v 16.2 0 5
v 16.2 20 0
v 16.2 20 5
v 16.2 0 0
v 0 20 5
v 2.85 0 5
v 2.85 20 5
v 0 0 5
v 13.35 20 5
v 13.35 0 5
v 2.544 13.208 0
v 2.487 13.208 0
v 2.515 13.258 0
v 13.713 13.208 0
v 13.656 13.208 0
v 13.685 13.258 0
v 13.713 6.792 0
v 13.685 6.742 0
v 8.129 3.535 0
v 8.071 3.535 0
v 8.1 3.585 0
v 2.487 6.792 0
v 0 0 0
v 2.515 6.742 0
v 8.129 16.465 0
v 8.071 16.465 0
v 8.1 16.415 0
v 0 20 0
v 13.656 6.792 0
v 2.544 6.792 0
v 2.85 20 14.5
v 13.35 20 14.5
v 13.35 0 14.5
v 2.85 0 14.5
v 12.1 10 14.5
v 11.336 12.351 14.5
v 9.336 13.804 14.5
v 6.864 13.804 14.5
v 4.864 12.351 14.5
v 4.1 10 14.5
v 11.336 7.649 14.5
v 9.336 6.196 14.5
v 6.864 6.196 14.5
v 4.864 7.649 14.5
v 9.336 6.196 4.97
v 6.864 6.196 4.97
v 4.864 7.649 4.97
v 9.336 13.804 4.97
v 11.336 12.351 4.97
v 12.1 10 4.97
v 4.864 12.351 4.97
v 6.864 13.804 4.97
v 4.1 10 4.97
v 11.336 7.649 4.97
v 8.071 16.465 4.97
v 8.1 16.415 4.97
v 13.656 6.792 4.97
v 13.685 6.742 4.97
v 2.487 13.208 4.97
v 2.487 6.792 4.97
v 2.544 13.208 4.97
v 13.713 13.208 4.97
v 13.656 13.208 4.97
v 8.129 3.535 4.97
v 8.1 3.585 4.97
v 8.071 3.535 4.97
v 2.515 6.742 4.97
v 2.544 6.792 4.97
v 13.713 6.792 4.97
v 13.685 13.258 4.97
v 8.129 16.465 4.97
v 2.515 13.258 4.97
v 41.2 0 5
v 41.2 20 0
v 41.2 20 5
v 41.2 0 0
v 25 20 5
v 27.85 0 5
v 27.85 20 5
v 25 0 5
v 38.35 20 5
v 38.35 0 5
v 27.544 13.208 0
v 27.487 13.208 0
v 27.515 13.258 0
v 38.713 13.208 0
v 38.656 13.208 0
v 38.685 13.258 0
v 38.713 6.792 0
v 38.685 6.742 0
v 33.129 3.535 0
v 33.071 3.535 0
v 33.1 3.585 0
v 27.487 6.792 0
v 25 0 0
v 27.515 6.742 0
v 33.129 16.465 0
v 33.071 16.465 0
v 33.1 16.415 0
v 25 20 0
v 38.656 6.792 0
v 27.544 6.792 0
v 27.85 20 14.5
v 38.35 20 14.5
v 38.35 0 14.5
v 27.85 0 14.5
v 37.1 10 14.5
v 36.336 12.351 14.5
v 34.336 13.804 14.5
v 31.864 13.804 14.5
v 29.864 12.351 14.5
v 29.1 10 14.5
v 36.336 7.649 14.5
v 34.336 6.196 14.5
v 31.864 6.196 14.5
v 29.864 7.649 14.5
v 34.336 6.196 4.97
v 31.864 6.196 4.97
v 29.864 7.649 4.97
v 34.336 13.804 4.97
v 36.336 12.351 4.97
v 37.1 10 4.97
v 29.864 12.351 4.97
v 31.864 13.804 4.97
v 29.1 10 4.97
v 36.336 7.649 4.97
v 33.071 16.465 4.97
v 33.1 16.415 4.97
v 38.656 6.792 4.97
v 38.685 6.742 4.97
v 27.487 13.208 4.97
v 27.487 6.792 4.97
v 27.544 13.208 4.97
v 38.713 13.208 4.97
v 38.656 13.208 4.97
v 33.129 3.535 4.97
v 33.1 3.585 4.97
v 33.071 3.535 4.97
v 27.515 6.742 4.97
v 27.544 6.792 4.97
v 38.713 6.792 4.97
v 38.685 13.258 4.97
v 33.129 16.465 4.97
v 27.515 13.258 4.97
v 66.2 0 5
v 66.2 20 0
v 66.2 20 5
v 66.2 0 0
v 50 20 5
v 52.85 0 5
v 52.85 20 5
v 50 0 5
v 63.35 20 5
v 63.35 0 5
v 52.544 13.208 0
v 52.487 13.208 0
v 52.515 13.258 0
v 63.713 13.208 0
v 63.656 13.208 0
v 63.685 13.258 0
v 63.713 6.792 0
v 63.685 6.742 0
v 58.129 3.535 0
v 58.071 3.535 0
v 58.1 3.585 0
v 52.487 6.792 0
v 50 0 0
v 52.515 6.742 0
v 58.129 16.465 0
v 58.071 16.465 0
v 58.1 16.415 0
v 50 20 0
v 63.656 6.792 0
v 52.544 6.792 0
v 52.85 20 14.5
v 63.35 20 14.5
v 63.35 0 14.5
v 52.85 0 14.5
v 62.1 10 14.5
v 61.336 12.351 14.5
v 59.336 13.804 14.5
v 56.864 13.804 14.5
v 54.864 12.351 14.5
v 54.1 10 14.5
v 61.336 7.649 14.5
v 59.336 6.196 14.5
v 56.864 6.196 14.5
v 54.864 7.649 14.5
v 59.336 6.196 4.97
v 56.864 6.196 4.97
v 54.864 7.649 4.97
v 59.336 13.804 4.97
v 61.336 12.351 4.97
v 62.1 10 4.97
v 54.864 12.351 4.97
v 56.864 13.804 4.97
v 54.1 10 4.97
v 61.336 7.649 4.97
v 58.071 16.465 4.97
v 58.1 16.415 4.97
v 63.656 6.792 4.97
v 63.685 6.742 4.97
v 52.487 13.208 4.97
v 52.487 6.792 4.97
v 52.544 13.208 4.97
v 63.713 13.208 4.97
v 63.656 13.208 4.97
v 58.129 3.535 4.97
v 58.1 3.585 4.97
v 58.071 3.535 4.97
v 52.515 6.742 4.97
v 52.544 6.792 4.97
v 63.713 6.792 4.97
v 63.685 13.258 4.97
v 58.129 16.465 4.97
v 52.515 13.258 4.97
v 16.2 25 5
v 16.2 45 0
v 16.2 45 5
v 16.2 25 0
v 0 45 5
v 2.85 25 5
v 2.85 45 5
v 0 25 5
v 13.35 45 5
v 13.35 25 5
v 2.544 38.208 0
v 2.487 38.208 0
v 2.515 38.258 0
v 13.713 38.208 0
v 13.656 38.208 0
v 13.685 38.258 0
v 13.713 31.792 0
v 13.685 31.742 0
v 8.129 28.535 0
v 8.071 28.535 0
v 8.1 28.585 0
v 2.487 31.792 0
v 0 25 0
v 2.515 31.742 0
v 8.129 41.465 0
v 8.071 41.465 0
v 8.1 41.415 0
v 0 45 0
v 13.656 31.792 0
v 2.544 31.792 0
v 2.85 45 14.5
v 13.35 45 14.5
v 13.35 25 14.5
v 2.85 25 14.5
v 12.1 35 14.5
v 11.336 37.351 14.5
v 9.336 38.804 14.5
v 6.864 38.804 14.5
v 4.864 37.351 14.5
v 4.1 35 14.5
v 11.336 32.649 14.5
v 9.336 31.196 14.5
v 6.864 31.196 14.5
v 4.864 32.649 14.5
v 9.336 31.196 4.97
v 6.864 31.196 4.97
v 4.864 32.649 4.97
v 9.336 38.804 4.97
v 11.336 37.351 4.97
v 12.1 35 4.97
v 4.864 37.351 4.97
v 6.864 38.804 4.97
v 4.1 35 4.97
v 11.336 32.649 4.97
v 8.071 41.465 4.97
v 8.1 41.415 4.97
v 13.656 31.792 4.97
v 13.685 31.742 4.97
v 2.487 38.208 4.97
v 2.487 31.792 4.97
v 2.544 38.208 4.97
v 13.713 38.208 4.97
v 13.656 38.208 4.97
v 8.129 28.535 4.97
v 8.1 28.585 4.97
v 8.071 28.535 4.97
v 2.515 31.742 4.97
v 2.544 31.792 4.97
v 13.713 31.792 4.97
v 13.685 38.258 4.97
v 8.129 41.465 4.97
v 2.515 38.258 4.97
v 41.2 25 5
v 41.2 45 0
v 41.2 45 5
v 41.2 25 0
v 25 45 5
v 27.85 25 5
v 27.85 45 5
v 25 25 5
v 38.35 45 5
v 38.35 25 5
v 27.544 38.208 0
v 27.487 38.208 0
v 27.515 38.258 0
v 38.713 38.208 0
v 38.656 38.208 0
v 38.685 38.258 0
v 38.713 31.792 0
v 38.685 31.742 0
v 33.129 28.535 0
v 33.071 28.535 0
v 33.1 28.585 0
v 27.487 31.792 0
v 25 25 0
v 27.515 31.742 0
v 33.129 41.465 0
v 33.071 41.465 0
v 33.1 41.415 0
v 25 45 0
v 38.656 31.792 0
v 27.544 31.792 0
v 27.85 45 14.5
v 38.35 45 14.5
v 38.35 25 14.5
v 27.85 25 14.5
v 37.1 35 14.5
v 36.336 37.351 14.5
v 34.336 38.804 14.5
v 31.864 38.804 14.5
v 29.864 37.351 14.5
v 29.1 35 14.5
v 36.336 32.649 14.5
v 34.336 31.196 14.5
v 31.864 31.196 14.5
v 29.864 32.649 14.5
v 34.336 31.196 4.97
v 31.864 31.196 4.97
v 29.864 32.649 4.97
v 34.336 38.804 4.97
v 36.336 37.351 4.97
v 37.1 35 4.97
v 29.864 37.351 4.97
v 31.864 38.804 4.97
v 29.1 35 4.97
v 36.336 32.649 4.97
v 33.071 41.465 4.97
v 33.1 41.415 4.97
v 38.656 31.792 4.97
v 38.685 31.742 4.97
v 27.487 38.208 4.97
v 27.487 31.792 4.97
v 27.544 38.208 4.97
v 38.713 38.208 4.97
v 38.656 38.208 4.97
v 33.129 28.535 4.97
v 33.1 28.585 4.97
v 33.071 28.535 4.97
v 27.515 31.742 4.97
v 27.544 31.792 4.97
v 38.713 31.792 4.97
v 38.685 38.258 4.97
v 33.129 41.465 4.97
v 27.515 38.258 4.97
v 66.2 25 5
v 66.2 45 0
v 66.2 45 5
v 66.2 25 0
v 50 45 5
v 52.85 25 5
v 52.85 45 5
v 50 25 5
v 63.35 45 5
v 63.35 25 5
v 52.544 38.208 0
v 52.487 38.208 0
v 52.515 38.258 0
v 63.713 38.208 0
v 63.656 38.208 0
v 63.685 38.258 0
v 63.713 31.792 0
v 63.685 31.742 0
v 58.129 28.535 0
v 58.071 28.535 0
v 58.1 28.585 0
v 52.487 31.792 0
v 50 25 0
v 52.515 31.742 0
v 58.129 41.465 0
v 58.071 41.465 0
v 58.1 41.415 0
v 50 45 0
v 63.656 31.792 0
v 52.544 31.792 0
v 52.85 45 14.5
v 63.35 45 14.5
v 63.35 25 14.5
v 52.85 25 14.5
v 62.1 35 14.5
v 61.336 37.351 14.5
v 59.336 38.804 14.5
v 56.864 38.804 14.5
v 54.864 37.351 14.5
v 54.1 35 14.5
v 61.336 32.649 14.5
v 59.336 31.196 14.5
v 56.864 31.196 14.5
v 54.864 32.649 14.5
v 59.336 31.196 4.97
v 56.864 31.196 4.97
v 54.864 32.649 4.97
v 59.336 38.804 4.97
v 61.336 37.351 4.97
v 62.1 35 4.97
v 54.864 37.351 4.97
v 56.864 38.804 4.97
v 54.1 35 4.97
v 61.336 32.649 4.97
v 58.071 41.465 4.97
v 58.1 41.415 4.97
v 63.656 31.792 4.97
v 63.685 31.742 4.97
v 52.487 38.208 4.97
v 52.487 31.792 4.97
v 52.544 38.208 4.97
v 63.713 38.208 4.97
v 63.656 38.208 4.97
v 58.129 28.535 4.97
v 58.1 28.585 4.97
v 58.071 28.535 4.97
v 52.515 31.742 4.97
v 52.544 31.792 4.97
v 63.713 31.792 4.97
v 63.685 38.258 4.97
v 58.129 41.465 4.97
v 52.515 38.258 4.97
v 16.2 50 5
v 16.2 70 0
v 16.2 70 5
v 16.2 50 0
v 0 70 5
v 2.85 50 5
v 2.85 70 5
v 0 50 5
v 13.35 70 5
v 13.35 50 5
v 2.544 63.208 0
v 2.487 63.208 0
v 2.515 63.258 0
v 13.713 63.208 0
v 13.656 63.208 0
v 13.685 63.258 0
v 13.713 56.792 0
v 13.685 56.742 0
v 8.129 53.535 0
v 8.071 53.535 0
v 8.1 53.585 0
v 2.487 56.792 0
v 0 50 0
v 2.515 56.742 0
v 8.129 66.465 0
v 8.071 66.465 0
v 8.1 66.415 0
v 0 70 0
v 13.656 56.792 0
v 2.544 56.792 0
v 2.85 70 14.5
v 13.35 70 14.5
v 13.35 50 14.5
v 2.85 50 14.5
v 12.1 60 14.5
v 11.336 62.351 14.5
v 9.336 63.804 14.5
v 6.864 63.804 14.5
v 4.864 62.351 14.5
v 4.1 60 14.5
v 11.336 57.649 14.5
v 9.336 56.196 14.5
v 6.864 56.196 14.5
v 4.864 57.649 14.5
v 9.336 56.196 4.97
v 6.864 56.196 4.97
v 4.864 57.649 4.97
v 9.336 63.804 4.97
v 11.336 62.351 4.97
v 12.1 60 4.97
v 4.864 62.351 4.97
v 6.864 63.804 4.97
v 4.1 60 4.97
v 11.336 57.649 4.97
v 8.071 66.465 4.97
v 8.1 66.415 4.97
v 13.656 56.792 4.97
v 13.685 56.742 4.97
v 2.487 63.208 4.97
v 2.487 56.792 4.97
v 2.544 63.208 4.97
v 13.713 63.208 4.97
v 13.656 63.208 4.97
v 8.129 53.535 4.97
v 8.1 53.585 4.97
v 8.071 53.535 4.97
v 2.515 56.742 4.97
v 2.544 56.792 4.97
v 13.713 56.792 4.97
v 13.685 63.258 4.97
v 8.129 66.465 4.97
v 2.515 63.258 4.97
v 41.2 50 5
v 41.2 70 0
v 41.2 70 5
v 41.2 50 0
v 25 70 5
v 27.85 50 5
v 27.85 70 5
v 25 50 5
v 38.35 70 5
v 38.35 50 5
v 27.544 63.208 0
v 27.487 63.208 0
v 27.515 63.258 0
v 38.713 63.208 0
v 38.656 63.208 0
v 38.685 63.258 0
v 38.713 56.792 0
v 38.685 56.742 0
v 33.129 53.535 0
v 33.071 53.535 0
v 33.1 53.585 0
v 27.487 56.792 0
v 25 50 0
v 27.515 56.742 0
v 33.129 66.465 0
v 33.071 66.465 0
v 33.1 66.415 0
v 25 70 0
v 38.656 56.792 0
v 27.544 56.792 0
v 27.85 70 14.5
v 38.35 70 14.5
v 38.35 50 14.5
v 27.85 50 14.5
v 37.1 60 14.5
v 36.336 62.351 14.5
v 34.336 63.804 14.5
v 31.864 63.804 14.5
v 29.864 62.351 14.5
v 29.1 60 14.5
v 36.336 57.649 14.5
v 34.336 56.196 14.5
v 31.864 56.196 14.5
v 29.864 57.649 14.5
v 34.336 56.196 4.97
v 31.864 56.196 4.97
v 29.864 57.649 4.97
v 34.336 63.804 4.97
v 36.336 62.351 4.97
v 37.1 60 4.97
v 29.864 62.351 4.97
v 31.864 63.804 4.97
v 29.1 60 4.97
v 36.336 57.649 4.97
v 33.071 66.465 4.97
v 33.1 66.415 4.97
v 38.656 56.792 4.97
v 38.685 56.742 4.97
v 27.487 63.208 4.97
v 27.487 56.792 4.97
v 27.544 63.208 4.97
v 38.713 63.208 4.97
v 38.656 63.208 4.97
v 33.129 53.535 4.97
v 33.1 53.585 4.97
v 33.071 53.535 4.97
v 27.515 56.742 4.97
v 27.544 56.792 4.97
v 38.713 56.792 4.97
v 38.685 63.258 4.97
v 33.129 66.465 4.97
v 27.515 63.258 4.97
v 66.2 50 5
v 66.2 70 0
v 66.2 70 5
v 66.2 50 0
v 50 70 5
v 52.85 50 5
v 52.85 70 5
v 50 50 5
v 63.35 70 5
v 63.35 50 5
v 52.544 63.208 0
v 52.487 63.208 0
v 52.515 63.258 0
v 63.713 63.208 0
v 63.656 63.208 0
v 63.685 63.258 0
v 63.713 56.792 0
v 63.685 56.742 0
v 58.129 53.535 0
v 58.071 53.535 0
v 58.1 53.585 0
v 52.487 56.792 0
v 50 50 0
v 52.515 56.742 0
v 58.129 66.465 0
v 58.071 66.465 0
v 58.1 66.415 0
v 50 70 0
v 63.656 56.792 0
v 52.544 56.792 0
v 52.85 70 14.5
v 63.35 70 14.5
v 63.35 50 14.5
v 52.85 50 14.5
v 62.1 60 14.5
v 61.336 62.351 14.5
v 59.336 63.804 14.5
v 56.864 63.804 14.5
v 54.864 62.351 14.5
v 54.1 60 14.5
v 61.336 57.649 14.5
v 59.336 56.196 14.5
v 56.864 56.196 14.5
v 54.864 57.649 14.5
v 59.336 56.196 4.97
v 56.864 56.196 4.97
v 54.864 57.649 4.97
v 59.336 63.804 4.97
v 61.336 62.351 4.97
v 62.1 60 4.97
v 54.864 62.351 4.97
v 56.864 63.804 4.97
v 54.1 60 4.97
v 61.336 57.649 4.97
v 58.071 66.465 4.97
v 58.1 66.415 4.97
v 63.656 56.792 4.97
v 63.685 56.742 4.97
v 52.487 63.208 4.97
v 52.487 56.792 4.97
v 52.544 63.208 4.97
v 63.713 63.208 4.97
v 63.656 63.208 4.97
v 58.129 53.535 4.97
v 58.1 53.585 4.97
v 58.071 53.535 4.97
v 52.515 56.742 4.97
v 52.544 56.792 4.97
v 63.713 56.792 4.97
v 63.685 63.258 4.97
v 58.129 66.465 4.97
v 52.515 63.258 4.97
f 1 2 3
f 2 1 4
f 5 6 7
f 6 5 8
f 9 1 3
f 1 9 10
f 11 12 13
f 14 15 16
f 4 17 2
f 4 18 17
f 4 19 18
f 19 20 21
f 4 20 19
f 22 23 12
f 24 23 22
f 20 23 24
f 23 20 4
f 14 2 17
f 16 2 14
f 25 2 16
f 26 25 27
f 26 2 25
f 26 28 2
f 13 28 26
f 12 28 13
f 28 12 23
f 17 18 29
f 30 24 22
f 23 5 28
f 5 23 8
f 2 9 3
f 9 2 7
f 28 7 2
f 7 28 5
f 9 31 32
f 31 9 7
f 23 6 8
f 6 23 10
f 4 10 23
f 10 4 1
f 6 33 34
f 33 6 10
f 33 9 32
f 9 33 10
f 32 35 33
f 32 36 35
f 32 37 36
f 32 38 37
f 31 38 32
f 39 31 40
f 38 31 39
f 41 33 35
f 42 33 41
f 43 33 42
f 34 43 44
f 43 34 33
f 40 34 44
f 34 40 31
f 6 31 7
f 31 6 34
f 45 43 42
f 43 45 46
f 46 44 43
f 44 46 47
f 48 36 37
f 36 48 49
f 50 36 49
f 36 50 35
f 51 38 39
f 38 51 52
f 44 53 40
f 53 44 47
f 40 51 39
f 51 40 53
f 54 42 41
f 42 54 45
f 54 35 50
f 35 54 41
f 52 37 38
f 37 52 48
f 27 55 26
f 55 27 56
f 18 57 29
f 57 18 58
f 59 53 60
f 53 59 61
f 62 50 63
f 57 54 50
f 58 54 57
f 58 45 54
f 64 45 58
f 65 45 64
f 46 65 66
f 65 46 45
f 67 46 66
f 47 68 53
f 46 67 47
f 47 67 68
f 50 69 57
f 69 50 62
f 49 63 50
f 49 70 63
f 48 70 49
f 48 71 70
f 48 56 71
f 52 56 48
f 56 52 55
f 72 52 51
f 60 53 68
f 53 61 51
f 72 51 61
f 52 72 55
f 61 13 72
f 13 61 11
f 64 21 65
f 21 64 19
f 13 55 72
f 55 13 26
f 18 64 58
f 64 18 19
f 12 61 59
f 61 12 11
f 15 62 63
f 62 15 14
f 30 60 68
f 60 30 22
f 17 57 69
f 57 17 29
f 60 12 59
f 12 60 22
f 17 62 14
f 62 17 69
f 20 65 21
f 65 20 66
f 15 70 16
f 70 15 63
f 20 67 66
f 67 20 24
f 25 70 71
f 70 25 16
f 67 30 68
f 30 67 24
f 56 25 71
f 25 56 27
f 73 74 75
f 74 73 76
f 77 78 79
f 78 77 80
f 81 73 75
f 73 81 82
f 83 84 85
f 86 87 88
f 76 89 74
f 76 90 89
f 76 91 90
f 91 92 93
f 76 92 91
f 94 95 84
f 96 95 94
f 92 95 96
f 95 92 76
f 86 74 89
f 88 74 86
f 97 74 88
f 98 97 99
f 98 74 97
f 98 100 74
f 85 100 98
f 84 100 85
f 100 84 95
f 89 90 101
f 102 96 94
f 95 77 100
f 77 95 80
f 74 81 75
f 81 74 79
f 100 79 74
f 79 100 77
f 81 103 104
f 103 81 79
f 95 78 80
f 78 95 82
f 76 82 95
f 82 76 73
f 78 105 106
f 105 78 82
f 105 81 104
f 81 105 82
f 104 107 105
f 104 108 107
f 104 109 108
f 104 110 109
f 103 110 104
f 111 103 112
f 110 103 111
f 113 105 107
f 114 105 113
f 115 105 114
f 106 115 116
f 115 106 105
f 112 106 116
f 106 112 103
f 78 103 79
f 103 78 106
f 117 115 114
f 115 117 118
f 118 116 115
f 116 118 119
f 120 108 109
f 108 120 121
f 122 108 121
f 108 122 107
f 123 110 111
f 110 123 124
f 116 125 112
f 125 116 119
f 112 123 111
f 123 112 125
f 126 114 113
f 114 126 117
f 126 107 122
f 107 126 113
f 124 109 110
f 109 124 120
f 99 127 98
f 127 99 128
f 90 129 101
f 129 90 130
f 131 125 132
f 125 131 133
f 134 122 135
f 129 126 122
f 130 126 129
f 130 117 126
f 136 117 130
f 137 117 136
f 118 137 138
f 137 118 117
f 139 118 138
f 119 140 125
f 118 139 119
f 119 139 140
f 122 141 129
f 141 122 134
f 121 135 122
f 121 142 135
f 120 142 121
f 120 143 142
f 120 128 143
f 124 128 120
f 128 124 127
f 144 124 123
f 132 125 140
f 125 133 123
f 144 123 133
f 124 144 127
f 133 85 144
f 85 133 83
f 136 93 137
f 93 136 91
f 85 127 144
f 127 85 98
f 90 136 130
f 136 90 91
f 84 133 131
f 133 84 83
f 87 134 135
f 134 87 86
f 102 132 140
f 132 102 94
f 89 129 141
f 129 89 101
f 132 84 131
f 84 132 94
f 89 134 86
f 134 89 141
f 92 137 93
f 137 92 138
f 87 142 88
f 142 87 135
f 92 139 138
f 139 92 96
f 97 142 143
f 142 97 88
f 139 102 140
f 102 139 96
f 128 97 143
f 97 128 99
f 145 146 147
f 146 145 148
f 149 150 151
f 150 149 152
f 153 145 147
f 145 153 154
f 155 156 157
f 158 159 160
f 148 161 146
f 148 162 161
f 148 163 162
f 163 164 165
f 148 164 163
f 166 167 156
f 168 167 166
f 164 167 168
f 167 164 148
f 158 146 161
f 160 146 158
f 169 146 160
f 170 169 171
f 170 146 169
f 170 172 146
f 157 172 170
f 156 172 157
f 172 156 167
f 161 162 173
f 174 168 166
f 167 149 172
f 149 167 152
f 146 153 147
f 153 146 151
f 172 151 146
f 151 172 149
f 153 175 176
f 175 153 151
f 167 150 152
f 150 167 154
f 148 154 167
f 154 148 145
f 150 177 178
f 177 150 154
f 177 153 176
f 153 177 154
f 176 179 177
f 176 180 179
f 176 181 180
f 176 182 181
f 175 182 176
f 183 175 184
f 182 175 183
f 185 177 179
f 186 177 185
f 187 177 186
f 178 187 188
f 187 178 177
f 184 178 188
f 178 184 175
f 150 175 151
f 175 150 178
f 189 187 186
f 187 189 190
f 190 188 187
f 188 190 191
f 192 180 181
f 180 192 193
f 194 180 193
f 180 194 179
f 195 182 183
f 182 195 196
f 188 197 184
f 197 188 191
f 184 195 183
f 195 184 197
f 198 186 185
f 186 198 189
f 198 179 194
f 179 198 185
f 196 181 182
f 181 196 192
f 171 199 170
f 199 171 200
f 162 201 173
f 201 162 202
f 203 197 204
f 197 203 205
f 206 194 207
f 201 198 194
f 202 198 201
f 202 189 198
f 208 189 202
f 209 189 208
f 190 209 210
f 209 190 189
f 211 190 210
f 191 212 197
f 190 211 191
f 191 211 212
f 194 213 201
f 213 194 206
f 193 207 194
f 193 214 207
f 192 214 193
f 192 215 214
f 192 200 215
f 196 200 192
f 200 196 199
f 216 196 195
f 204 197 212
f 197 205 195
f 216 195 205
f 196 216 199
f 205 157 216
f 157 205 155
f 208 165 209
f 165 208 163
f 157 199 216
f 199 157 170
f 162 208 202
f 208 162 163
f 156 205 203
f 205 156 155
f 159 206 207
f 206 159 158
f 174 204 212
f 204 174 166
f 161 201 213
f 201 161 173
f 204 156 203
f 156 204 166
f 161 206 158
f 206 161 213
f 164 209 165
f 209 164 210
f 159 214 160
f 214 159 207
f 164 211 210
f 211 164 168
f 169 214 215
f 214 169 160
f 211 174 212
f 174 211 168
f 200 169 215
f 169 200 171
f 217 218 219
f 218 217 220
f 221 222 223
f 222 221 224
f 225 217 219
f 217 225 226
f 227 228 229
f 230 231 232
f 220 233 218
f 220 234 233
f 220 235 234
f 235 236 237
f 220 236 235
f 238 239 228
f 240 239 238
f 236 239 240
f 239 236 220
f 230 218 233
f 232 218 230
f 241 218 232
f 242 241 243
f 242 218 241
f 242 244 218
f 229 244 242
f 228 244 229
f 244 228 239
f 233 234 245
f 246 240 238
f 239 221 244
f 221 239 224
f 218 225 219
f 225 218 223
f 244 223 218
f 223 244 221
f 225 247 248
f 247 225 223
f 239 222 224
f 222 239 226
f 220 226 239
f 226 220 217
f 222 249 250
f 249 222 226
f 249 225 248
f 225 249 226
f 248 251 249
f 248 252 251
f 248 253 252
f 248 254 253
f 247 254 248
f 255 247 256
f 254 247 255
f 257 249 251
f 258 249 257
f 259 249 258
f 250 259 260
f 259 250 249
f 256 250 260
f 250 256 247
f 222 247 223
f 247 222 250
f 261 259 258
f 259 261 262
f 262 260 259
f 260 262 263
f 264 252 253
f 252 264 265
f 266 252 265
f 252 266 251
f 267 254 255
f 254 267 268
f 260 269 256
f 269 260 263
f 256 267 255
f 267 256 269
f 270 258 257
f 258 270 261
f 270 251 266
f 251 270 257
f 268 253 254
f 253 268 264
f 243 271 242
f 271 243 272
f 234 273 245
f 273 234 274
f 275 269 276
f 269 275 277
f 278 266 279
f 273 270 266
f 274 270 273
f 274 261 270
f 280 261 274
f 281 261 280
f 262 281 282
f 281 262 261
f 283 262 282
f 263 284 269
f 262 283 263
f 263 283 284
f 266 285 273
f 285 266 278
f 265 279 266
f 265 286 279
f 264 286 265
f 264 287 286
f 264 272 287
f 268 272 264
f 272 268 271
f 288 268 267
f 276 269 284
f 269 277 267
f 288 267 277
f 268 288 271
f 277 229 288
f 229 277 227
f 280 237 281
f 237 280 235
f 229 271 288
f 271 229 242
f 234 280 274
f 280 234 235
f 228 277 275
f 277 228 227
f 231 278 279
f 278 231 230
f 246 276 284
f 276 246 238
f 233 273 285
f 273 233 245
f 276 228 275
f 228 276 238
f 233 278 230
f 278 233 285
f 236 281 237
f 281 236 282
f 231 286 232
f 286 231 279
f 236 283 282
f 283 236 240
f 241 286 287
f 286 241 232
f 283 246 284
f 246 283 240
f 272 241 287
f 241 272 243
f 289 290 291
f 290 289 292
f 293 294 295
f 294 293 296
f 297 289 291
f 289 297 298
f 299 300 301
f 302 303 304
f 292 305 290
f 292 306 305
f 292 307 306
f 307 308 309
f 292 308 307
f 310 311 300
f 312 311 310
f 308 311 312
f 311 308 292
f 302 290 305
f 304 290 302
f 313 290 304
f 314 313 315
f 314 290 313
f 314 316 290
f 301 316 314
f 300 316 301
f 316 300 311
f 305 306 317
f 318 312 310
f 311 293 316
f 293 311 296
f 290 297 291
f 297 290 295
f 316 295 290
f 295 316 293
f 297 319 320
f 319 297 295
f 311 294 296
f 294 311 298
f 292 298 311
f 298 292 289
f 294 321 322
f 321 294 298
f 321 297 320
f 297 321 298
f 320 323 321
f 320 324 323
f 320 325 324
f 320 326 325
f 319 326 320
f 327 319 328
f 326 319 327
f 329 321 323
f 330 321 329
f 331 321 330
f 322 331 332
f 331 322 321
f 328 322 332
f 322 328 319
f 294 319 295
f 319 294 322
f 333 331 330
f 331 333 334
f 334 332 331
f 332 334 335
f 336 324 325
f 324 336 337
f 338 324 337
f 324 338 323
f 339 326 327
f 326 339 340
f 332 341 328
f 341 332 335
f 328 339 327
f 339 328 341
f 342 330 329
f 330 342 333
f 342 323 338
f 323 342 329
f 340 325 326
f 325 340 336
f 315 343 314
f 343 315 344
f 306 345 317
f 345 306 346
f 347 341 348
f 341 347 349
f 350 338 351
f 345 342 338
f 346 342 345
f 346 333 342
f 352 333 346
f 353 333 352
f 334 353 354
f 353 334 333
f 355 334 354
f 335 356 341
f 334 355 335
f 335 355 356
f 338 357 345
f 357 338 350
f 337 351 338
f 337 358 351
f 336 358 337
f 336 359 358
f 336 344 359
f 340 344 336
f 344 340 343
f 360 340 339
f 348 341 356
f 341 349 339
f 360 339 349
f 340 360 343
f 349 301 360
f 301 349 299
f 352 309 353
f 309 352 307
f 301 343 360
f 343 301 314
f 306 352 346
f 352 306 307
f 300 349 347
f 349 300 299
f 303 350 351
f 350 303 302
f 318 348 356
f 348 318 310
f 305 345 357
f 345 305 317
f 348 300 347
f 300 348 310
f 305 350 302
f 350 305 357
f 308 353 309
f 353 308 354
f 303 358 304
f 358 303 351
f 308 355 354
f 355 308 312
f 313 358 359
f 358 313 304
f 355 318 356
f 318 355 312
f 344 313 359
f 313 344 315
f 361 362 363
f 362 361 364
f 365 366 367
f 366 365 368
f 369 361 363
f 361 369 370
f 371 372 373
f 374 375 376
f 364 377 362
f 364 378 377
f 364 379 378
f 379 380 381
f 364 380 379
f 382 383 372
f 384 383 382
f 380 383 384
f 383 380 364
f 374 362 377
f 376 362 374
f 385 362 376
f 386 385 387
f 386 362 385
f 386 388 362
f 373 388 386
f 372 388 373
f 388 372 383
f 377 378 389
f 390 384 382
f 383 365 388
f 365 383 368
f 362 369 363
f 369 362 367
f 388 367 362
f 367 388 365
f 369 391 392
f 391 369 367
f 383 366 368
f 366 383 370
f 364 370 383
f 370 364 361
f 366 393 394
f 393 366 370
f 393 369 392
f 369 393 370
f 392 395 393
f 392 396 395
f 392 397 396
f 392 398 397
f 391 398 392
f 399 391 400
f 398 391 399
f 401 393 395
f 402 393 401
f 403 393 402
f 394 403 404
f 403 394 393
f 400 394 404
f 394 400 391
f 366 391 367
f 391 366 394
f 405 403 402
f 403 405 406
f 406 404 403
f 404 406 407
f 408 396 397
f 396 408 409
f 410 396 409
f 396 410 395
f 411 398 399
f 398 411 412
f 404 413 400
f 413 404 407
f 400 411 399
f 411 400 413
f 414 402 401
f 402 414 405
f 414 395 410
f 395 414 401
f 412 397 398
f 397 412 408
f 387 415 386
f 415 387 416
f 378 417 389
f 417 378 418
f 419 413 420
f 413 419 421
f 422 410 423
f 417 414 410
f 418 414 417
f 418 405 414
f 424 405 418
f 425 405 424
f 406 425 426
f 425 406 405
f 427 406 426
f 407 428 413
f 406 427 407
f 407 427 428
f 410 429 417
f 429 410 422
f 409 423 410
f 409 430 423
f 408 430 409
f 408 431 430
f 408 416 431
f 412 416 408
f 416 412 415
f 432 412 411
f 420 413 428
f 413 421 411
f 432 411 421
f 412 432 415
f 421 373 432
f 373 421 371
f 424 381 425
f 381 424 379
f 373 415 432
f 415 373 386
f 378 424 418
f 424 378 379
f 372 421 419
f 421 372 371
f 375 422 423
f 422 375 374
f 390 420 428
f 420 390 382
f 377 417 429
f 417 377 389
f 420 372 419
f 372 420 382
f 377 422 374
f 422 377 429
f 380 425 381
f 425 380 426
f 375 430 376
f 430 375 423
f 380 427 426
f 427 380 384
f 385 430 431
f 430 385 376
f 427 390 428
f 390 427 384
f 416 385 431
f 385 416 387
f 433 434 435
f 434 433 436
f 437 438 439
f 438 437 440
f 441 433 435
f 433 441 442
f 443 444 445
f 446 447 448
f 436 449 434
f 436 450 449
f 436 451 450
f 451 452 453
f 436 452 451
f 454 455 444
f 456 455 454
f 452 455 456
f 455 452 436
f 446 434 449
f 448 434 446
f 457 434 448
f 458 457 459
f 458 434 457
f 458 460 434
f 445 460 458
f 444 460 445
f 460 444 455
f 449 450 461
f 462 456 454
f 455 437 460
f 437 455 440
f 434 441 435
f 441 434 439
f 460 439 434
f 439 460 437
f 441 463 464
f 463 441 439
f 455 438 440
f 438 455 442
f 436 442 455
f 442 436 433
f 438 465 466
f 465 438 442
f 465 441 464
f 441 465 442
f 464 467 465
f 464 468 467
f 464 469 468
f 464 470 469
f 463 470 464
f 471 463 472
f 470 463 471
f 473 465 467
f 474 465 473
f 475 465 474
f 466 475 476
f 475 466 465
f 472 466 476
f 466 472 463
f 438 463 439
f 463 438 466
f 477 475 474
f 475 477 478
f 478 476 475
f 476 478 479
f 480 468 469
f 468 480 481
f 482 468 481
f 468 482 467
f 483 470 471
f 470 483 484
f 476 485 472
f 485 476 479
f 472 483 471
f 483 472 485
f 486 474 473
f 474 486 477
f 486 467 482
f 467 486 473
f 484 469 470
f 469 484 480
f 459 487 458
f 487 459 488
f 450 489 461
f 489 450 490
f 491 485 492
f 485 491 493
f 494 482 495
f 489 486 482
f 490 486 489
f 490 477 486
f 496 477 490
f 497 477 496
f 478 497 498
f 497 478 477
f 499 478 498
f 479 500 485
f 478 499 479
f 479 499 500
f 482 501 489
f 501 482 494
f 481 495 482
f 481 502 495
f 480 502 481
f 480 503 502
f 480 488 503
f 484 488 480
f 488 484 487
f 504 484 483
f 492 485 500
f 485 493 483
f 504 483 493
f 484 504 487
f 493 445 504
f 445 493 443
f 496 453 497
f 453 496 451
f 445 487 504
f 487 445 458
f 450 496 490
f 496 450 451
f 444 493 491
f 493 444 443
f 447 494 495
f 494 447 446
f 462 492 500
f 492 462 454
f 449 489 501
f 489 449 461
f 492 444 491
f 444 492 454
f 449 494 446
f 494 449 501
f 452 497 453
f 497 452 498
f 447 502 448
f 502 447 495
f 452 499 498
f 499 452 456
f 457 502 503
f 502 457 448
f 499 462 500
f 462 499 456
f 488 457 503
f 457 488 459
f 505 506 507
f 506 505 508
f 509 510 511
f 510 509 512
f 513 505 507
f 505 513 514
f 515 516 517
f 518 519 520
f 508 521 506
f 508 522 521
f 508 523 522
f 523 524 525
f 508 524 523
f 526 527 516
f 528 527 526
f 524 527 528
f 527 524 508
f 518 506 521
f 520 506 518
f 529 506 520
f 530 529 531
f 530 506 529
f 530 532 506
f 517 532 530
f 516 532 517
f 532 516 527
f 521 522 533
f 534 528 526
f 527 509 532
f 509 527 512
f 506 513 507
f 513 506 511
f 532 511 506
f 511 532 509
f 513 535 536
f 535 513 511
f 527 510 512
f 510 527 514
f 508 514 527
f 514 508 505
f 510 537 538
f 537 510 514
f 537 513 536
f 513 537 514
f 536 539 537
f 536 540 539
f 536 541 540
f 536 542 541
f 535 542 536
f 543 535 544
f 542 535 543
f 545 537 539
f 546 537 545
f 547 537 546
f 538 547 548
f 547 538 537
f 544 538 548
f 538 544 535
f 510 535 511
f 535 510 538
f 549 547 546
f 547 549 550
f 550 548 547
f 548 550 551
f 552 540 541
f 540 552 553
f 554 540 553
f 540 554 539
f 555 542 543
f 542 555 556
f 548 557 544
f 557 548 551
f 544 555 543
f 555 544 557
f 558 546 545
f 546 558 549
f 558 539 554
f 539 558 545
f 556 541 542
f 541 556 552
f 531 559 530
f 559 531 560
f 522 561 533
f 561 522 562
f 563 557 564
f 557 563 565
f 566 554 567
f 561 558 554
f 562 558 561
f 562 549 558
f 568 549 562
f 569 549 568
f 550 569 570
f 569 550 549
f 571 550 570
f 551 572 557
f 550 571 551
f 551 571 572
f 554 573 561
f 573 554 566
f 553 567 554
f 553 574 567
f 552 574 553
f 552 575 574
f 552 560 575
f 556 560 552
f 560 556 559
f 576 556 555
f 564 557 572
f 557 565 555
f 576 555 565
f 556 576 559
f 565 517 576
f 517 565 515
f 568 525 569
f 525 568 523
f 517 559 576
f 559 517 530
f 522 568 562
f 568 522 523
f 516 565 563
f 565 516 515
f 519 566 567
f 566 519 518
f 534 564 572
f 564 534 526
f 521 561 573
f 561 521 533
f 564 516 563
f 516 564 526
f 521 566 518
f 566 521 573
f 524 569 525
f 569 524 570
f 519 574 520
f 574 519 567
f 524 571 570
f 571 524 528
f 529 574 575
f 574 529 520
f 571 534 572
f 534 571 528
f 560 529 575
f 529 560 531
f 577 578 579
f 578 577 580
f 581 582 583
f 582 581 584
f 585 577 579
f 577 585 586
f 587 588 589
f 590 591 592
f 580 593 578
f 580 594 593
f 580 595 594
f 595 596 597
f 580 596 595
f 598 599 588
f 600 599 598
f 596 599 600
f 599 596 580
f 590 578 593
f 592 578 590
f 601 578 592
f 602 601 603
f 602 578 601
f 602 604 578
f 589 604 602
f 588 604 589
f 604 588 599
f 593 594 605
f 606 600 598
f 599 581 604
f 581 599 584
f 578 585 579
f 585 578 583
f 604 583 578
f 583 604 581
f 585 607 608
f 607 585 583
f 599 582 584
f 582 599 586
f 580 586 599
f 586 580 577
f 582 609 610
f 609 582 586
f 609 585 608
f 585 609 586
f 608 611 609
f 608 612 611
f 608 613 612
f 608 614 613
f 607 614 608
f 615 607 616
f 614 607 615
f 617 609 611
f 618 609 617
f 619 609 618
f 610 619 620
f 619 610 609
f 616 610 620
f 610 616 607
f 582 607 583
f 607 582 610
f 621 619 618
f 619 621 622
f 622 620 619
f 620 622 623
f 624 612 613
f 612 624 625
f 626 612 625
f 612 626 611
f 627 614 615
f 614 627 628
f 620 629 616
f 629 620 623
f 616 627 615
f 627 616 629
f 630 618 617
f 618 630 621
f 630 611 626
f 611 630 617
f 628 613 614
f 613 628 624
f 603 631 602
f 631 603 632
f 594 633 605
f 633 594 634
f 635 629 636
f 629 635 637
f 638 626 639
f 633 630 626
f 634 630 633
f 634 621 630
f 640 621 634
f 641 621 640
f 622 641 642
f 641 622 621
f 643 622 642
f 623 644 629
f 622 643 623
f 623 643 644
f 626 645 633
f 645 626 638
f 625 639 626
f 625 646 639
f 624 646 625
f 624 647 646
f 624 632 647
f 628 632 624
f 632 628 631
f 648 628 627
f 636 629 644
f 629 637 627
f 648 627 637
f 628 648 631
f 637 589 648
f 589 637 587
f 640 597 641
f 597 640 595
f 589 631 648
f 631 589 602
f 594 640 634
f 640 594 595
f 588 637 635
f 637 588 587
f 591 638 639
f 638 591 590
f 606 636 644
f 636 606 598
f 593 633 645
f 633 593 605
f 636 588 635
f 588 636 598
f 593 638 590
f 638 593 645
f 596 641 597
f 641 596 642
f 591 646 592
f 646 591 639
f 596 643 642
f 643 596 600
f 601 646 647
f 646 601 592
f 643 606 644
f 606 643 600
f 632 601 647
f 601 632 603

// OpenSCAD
use <MCAD/shapes.scad>

topSlotHeight = 9.5;
topSlotWidth = 10.5;
slotWidth = 16.2;
slotLength = 20;
bottomSlotHeight = 5;
slotHeight = topSlotHeight + bottomSlotHeight;

bedWidth = 110;
bedLength = 125;
bedHeight = slotHeight * 1.2;

bedNutRadius = 5;
bedNutHeight = 0.226 * 25.4;

module tslotNutProfile() {
	union() {
	// bottom of tslot nut
		cube([slotWidth, slotLength, bottomSlotHeight]);
		translate([(slotWidth - topSlotWidth) / 2,0,bottomSlotHeight - 0.1]) 
			cube([topSlotWidth, slotLength, topSlotHeight + 0.1]);
	}
}
module tslotNut() {
	difference() {
		difference() {
			tslotNutProfile();
			// drill the center hole
			translate([slotWidth / 2, slotLength / 2, -0.1]) 
				cylinder(r = 4, h = slotHeight + 0.2, $fn = 10);
		}
		// Create a nut/hex head "insert"

		translate([slotWidth / 2, slotLength / 2,2.1]) 
			rotate([0,0,90]) # quarter20Nut();
			//cylinder (r = 5, h = 2, $fn = 6);
	}
}
module quarter20Nut() {
	union() {
		// .438" - .428" across the flats, .226" - 0.212" height
		hexagon(size = 0.442 * 25.4, height = 0.226 * 25.4);
		// tap size .2010 (aka #7 drill)
		translate([0, 0, -5])
			cylinder(r = (.2010 / 2) * 25.4, h = 1 * 25.4);
	}
}
module lineup(num, space) {
	for( i = [0 : num - 1])
		translate([ space * i, 0, 0 ]) child(0);
}

module linedown(num, space) {
	for ( i = [ 0 : num - 1])
		translate([ 0, space * i, 0]) child(0);
}
module bedPlate() {
	cube( [bedWidth, bedLength + 25, slotHeight / 2] );
}
module bed() {
	spaceBetweenSlots = slotWidth * 1.8;

	difference() {
		cube( [bedWidth, bedLength, bedHeight] );
		// kick over the first slot
		translate([slotWidth * 0.8, 0, 0])
		for (i = [ 0 : floor(bedWidth / (slotWidth + spaceBetweenSlots))]) {
			translate([spaceBetweenSlots * i, 
							-0.1, 
							bedHeight - slotHeight + 0.1]) {
				scale([1, bedLength, 1]) tslotNutProfile();
			}
		}
	}
}
module printBed() {
	// take the difference of the nut inserts and the bed+drilled holes
	difference() {
		// take the difference of the drilled holes and the bed
		difference() {
			bed();

			linedown(3, 50) 
			// left holes
			difference() {
				translate([7, 10, -1]) cylinder(r = 3, h = bedHeight + 5, $fn = 10);
			
			}
			linedown(3, 50) 
				translate([bedWidth - 7, 10, -1]) 
					cylinder(r = 3, h = bedHeight + 2, $fn = 10);
		}
		// These are the nut inserts/hex head inserts
		linedown(3, 50)translate([7, 10, bedHeight - bedNutHeight + 0.1]) 
			//rotate([0, 0, 90])cylinder(r = bedNutRadius, h = bedNutHeight, $fn = 6);
			# quarter20Nut();

		linedown(3, 50) translate([bedWidth - 7, 10, bedHeight - bedNutHeight + 0.1]) 
			//rotate([0, 0, 90]) cylinder(r = bedNutRadius, h = bedNutHeight, $fn = 6);
			# quarter20Nut();
	}
}

//translate([0, 100, 0]) rotate([-270,0,0])printBed();

linedown (3, 25) lineup(3, 25) tslotNut();

//tslotNut();
